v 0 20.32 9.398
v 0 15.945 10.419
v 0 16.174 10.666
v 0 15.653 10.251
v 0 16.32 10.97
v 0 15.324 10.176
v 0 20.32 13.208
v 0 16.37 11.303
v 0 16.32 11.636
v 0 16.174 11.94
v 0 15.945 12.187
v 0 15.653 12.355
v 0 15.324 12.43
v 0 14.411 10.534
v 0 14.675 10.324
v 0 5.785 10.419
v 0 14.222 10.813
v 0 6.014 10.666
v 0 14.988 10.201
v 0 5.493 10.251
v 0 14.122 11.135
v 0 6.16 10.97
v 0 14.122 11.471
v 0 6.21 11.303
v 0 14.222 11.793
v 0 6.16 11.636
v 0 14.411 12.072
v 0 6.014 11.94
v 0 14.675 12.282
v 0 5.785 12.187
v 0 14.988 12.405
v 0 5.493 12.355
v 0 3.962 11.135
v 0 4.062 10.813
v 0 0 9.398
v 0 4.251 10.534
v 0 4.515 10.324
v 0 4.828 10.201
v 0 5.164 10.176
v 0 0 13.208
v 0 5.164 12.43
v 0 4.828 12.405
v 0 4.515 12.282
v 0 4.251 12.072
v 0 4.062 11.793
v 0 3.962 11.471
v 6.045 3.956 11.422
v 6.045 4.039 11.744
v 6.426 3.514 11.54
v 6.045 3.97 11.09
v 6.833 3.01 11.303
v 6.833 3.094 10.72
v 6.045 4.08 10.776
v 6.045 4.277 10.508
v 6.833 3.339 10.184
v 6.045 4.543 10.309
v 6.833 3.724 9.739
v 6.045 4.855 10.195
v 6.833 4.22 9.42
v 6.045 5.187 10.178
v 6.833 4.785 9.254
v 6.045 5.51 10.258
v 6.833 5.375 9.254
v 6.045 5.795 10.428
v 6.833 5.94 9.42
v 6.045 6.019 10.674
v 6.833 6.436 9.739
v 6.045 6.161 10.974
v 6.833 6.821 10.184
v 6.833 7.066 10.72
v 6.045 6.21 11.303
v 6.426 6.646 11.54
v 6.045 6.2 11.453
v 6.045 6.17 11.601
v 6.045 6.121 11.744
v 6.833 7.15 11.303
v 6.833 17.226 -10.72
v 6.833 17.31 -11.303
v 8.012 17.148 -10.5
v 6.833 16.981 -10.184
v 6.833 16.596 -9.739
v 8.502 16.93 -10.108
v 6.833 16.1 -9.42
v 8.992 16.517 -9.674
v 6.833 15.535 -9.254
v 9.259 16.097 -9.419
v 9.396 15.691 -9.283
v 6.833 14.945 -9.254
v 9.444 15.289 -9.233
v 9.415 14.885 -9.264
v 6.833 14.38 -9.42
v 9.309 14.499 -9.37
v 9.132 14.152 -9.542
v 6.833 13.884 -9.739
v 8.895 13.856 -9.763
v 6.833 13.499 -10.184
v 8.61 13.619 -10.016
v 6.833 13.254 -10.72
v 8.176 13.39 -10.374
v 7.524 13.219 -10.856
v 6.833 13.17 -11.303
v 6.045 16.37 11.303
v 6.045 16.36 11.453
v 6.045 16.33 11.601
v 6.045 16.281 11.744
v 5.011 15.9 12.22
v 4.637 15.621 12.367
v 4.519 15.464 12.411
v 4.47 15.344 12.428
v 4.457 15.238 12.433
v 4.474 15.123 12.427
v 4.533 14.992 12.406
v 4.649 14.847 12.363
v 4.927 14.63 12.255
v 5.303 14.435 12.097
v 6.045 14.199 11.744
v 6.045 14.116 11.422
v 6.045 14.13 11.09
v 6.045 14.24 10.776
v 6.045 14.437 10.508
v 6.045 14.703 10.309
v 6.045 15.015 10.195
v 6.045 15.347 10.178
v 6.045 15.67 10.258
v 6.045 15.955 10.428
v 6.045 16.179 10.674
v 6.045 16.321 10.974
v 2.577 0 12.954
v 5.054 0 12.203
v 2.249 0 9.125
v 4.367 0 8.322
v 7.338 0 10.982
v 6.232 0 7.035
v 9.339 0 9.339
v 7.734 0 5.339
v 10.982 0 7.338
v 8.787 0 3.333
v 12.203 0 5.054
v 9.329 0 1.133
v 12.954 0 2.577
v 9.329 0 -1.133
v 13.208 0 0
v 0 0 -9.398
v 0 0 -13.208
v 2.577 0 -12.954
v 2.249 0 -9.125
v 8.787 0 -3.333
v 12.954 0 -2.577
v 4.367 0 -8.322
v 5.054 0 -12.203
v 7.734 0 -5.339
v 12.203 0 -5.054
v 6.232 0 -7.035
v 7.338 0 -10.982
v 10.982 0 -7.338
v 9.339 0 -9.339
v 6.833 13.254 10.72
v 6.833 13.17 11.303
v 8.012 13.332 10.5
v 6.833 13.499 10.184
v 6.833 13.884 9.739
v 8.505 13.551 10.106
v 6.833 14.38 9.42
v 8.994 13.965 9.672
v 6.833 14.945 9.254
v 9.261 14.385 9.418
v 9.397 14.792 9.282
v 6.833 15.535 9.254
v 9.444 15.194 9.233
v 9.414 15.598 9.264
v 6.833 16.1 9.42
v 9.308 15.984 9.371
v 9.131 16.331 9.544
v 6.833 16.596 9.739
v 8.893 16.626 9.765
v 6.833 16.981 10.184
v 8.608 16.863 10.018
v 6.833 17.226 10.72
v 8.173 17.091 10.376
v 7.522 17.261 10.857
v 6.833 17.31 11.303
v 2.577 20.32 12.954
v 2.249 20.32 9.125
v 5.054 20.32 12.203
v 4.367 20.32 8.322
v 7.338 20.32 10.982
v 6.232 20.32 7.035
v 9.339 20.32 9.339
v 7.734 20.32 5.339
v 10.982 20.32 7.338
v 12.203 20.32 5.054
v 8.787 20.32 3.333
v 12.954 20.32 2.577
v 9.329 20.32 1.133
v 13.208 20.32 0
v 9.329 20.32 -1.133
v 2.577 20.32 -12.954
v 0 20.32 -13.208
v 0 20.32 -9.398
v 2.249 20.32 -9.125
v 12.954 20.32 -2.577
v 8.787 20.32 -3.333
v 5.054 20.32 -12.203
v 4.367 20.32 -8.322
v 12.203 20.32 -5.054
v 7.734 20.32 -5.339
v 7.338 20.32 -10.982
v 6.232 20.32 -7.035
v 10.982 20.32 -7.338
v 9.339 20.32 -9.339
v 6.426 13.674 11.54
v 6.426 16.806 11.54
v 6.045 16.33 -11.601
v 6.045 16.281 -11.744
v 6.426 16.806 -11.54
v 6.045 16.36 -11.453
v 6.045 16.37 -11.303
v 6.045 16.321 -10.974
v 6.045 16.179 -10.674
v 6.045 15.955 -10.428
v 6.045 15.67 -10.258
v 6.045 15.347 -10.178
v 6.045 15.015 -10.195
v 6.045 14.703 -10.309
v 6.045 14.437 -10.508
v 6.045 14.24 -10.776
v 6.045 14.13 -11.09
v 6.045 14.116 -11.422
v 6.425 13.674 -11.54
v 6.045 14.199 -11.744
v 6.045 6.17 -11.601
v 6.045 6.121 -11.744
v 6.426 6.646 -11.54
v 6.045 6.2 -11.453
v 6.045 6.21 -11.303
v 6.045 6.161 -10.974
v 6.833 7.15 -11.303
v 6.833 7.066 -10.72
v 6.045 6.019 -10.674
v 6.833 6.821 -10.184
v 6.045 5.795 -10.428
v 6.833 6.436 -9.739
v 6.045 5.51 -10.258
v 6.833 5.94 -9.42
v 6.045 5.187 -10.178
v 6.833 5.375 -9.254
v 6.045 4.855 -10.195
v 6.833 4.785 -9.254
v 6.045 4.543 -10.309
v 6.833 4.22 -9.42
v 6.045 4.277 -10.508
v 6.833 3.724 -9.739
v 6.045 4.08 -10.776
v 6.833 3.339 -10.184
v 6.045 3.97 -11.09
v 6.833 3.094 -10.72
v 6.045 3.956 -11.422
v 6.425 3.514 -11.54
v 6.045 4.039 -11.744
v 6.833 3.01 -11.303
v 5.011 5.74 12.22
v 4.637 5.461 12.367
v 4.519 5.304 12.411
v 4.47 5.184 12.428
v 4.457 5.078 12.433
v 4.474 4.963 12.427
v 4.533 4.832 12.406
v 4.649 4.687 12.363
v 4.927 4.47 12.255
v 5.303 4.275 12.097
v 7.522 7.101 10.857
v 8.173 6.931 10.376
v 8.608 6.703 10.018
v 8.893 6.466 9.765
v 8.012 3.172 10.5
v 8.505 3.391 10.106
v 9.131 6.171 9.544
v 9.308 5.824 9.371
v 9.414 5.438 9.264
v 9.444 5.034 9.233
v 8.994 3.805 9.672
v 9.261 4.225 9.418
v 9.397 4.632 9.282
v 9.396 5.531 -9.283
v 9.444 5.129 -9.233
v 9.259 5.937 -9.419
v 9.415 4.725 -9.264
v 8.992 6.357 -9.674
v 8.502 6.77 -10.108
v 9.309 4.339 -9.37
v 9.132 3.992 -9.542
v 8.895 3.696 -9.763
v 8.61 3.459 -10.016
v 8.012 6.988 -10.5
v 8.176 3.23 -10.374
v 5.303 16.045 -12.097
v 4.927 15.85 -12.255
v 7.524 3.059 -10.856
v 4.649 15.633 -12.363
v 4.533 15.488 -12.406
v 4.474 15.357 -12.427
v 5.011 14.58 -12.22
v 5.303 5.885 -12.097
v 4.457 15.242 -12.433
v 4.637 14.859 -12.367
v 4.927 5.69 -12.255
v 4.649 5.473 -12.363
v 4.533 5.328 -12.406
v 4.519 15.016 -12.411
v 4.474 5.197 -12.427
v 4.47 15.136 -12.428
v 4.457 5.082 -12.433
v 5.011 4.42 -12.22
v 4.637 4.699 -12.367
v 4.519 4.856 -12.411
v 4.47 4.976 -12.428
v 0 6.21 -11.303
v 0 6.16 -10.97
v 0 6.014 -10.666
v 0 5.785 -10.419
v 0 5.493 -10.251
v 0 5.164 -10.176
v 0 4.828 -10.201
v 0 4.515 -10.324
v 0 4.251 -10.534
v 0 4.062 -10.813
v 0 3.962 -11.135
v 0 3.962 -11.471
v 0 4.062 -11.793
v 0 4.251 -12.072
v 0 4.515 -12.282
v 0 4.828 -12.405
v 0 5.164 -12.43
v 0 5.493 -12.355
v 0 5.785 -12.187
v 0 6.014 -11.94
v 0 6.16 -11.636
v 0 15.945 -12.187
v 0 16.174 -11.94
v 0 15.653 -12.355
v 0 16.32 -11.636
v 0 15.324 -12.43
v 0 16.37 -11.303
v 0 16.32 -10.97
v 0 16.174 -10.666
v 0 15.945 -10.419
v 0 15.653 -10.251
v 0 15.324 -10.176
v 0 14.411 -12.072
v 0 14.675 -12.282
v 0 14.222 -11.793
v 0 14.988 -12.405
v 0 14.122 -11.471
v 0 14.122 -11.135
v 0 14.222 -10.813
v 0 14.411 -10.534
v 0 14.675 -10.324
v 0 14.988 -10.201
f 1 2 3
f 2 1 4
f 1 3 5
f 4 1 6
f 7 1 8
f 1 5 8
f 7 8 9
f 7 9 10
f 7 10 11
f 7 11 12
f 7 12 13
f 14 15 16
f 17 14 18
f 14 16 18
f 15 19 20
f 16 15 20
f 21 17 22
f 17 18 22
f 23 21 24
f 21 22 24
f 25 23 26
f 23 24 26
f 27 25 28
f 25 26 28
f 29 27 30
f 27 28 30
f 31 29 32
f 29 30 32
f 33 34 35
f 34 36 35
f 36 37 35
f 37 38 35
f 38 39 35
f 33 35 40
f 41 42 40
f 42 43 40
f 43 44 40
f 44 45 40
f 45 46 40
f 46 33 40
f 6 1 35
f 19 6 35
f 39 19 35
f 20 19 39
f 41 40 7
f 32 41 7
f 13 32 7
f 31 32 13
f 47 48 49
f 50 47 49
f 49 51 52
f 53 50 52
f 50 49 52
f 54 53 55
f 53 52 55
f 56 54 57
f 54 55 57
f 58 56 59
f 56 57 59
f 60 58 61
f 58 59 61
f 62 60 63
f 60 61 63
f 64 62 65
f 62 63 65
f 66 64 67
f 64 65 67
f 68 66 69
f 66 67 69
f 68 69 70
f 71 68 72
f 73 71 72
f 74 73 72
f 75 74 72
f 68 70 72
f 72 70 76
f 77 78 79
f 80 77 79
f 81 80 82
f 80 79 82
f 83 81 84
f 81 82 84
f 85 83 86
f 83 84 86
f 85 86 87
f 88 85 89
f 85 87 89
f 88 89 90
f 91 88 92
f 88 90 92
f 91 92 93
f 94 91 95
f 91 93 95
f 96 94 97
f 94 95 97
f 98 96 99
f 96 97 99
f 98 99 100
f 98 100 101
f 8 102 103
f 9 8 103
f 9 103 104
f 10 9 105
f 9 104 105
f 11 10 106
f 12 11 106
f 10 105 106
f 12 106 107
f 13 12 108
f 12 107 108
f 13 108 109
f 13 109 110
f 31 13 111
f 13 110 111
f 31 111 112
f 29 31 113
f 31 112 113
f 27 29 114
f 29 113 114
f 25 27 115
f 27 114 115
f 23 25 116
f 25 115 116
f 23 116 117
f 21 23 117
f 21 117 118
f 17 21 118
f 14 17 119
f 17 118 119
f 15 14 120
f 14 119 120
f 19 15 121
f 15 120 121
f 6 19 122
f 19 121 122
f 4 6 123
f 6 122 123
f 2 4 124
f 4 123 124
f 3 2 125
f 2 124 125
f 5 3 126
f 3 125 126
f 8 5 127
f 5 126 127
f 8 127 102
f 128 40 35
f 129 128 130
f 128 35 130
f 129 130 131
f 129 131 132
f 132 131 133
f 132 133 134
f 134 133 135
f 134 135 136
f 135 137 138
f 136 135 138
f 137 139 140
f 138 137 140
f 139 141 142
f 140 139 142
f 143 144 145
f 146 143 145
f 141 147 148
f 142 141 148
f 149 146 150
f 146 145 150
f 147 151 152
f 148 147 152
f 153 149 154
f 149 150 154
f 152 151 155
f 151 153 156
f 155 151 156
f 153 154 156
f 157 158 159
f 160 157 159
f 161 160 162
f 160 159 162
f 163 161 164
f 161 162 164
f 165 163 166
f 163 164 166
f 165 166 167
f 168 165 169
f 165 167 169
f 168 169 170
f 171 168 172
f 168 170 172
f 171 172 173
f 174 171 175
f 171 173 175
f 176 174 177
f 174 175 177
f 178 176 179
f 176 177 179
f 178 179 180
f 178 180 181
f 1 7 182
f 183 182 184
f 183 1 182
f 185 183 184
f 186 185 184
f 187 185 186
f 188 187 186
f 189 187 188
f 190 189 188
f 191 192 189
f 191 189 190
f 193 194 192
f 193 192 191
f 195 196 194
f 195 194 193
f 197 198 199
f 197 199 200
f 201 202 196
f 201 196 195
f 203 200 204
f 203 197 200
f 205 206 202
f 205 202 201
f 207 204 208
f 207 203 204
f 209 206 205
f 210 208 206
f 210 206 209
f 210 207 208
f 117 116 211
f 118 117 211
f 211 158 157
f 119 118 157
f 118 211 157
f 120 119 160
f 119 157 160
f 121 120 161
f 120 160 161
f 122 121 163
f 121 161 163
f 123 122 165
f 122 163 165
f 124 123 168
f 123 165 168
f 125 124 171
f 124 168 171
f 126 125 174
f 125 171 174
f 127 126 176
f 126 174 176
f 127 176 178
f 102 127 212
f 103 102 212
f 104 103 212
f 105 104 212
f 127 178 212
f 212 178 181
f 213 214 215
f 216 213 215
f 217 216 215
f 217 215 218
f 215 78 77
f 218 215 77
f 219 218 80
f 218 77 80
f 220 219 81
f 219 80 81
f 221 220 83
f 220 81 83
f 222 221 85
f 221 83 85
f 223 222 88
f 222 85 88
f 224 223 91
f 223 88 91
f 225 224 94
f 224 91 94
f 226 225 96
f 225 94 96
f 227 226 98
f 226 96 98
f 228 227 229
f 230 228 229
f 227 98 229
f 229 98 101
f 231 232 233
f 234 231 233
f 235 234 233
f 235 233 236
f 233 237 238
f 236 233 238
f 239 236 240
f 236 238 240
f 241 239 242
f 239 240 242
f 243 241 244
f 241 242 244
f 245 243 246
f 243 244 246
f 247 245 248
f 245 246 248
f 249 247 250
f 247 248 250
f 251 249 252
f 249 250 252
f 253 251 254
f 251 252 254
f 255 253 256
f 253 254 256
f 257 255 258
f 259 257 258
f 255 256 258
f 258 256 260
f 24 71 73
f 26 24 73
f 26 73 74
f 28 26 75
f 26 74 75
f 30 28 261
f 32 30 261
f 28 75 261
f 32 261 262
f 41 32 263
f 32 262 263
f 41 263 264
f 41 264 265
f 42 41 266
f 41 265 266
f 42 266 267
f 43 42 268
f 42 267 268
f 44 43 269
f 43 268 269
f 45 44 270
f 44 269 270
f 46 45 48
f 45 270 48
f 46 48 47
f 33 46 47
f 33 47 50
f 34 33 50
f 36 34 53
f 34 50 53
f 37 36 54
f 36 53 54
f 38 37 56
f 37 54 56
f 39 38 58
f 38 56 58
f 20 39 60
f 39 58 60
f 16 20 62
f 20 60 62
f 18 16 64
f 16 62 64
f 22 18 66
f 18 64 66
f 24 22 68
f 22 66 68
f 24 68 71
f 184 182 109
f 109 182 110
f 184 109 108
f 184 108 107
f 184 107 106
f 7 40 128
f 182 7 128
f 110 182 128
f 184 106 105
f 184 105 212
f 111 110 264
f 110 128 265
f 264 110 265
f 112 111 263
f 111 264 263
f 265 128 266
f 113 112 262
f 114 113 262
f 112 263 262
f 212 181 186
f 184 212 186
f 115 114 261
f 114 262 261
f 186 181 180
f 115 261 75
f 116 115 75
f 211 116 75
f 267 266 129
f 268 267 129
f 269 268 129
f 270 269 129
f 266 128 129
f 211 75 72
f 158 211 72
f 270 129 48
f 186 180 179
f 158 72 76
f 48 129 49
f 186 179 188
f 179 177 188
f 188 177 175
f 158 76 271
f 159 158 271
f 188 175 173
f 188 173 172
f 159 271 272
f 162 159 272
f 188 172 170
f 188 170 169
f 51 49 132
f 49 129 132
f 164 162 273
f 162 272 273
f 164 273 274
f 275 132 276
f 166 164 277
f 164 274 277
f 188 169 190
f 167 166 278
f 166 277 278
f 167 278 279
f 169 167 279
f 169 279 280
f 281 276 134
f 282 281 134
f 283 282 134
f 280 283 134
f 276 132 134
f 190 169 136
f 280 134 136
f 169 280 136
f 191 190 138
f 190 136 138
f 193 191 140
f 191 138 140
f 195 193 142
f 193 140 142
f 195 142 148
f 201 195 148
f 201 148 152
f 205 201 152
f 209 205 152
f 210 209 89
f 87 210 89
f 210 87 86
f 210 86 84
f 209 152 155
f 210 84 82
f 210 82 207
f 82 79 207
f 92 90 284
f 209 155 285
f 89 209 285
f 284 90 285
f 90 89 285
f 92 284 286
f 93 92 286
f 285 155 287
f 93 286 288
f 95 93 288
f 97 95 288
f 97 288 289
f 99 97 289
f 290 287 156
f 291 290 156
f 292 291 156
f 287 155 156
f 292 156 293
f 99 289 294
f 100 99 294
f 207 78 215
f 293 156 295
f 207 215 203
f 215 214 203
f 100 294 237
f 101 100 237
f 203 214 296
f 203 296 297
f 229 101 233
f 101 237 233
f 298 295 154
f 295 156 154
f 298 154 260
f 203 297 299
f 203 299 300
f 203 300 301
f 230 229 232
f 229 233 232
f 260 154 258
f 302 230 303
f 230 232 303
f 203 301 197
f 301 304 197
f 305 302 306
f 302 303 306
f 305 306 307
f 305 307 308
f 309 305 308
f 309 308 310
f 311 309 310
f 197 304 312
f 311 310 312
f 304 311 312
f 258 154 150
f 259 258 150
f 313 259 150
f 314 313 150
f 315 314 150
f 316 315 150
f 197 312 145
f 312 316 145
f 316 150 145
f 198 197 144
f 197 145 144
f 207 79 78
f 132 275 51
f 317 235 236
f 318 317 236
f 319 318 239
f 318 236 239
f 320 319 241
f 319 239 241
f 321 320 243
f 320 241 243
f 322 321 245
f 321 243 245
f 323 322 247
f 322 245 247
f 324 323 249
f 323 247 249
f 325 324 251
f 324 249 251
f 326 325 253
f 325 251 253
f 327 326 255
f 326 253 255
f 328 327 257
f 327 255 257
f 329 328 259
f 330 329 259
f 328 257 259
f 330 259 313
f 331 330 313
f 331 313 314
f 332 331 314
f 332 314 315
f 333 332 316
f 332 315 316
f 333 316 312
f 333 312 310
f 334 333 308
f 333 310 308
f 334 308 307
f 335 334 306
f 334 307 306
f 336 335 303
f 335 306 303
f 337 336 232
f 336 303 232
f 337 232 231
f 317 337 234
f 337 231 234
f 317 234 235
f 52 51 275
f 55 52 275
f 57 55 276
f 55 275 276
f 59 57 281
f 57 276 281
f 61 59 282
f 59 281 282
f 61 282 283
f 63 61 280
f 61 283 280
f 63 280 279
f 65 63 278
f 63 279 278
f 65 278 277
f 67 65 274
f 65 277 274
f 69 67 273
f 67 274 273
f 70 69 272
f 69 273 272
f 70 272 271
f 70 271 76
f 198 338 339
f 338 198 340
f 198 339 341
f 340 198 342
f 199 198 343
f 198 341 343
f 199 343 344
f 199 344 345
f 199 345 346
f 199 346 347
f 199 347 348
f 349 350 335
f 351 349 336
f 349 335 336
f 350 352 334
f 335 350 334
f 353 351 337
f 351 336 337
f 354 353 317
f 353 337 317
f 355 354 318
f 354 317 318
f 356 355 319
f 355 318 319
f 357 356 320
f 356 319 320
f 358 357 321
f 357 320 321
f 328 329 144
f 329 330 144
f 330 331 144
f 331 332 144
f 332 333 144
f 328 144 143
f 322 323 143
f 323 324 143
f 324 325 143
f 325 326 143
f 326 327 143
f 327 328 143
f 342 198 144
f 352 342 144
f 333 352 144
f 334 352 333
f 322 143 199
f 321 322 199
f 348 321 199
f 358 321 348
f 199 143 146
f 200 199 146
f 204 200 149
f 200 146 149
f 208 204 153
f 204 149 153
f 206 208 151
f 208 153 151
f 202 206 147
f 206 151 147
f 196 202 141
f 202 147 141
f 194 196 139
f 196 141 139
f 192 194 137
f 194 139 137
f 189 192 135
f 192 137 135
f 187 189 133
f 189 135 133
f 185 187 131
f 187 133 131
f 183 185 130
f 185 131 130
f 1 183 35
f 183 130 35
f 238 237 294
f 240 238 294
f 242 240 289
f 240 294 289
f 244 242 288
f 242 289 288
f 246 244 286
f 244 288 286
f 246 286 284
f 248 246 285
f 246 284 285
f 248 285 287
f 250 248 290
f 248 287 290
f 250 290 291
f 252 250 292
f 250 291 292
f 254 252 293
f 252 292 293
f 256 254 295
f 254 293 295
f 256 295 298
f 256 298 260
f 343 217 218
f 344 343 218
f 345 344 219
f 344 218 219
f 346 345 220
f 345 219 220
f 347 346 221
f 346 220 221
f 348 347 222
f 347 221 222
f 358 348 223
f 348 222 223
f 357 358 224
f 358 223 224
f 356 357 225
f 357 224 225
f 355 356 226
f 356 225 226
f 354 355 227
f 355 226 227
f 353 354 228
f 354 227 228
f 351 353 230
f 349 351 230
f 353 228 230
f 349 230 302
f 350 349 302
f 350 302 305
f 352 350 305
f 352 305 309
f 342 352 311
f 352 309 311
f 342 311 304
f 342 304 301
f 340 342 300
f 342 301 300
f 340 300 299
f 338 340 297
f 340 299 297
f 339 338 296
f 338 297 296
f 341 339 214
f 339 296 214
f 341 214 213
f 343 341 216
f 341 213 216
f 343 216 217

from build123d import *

# Parameters (mm, degrees)
BOSS_EXTRUDE1_DEPTH = 20.32


# Read off the part's stored shape, not the designer's step: #2 Clearance Hole1
with BuildPart() as part:
    # Sketch1 → Boss-Extrude1 (new body)
    with BuildSketch(Plane(origin=(0, 0, 0), x_dir=(1, 0, 0), z_dir=(0, 1, 0))):
        with BuildLine():
            Line((0, 13.208), (0, 9.398))
            ThreePointArc((0, 9.398), (9.398, 0), (0, -9.398))
            Line((0, -9.398), (0, -13.208))
            ThreePointArc((0, -13.208), (13.208, 0), (0, 13.208))
        make_face()
    extrude(amount=BOSS_EXTRUDE1_DEPTH)

    # #2 Clearance Hole1 outline → #2 Clearance Hole1 (revolve, cut)
    with BuildSketch(Plane(origin=(0, 5.08, -11.303), x_dir=(0, 1, 0), z_dir=(0, 0, -1))):
        Polygon((2.0701, 6.833260935), (2.0701, 9.445172288), (0, 9.445172288), (0, 0), (1.1303, 0), (1.1303, 6.044675101), align=None)
    revolve(axis=Axis((0, 5.08, -11.303), (1, 0, 0)), mode=Mode.SUBTRACT)

    # 2 Clearance Hole1 2 outline → 2 Clearance Hole1 2 (revolve, cut)
    with BuildSketch(Plane(origin=(0, 5.08, 11.303), x_dir=(0, 1, 0), z_dir=(0, 0, -1))):
        Polygon((2.0701, 9.445172288), (0, 9.445172288), (0, 0), (1.1303, 0), (1.1303, 6.044675101), (2.0701, 6.833260935), align=None)
    revolve(axis=Axis((0, 5.08, 11.303), (1, 0, 0)), mode=Mode.SUBTRACT)

    # 2 Clearance Hole1 3 outline → 2 Clearance Hole1 3 (revolve, cut)
    with BuildSketch(Plane(origin=(0, 15.24, 11.303), x_dir=(0, 1, 0), z_dir=(0, 0, -1))):
        Polygon((2.0701, 9.445172288), (0, 9.445172288), (0, 0), (1.1303, 0), (1.1303, 6.044675101), (2.0701, 6.833260935), align=None)
    revolve(axis=Axis((0, 15.24, 11.303), (1, 0, 0)), mode=Mode.SUBTRACT)

    # 2 Clearance Hole1 4 outline → 2 Clearance Hole1 4 (revolve, cut)
    with BuildSketch(Plane(origin=(0, 15.24, -11.303), x_dir=(0, 1, 0), z_dir=(0, 0, -1))):
        Polygon((2.0701, 9.445172288), (0, 9.445172288), (0, 0), (1.1303, 0), (1.1303, 6.044675101), (2.0701, 6.833260935), align=None)
    revolve(axis=Axis((0, 15.24, -11.303), (1, 0, 0)), mode=Mode.SUBTRACT)


solid = part.part
